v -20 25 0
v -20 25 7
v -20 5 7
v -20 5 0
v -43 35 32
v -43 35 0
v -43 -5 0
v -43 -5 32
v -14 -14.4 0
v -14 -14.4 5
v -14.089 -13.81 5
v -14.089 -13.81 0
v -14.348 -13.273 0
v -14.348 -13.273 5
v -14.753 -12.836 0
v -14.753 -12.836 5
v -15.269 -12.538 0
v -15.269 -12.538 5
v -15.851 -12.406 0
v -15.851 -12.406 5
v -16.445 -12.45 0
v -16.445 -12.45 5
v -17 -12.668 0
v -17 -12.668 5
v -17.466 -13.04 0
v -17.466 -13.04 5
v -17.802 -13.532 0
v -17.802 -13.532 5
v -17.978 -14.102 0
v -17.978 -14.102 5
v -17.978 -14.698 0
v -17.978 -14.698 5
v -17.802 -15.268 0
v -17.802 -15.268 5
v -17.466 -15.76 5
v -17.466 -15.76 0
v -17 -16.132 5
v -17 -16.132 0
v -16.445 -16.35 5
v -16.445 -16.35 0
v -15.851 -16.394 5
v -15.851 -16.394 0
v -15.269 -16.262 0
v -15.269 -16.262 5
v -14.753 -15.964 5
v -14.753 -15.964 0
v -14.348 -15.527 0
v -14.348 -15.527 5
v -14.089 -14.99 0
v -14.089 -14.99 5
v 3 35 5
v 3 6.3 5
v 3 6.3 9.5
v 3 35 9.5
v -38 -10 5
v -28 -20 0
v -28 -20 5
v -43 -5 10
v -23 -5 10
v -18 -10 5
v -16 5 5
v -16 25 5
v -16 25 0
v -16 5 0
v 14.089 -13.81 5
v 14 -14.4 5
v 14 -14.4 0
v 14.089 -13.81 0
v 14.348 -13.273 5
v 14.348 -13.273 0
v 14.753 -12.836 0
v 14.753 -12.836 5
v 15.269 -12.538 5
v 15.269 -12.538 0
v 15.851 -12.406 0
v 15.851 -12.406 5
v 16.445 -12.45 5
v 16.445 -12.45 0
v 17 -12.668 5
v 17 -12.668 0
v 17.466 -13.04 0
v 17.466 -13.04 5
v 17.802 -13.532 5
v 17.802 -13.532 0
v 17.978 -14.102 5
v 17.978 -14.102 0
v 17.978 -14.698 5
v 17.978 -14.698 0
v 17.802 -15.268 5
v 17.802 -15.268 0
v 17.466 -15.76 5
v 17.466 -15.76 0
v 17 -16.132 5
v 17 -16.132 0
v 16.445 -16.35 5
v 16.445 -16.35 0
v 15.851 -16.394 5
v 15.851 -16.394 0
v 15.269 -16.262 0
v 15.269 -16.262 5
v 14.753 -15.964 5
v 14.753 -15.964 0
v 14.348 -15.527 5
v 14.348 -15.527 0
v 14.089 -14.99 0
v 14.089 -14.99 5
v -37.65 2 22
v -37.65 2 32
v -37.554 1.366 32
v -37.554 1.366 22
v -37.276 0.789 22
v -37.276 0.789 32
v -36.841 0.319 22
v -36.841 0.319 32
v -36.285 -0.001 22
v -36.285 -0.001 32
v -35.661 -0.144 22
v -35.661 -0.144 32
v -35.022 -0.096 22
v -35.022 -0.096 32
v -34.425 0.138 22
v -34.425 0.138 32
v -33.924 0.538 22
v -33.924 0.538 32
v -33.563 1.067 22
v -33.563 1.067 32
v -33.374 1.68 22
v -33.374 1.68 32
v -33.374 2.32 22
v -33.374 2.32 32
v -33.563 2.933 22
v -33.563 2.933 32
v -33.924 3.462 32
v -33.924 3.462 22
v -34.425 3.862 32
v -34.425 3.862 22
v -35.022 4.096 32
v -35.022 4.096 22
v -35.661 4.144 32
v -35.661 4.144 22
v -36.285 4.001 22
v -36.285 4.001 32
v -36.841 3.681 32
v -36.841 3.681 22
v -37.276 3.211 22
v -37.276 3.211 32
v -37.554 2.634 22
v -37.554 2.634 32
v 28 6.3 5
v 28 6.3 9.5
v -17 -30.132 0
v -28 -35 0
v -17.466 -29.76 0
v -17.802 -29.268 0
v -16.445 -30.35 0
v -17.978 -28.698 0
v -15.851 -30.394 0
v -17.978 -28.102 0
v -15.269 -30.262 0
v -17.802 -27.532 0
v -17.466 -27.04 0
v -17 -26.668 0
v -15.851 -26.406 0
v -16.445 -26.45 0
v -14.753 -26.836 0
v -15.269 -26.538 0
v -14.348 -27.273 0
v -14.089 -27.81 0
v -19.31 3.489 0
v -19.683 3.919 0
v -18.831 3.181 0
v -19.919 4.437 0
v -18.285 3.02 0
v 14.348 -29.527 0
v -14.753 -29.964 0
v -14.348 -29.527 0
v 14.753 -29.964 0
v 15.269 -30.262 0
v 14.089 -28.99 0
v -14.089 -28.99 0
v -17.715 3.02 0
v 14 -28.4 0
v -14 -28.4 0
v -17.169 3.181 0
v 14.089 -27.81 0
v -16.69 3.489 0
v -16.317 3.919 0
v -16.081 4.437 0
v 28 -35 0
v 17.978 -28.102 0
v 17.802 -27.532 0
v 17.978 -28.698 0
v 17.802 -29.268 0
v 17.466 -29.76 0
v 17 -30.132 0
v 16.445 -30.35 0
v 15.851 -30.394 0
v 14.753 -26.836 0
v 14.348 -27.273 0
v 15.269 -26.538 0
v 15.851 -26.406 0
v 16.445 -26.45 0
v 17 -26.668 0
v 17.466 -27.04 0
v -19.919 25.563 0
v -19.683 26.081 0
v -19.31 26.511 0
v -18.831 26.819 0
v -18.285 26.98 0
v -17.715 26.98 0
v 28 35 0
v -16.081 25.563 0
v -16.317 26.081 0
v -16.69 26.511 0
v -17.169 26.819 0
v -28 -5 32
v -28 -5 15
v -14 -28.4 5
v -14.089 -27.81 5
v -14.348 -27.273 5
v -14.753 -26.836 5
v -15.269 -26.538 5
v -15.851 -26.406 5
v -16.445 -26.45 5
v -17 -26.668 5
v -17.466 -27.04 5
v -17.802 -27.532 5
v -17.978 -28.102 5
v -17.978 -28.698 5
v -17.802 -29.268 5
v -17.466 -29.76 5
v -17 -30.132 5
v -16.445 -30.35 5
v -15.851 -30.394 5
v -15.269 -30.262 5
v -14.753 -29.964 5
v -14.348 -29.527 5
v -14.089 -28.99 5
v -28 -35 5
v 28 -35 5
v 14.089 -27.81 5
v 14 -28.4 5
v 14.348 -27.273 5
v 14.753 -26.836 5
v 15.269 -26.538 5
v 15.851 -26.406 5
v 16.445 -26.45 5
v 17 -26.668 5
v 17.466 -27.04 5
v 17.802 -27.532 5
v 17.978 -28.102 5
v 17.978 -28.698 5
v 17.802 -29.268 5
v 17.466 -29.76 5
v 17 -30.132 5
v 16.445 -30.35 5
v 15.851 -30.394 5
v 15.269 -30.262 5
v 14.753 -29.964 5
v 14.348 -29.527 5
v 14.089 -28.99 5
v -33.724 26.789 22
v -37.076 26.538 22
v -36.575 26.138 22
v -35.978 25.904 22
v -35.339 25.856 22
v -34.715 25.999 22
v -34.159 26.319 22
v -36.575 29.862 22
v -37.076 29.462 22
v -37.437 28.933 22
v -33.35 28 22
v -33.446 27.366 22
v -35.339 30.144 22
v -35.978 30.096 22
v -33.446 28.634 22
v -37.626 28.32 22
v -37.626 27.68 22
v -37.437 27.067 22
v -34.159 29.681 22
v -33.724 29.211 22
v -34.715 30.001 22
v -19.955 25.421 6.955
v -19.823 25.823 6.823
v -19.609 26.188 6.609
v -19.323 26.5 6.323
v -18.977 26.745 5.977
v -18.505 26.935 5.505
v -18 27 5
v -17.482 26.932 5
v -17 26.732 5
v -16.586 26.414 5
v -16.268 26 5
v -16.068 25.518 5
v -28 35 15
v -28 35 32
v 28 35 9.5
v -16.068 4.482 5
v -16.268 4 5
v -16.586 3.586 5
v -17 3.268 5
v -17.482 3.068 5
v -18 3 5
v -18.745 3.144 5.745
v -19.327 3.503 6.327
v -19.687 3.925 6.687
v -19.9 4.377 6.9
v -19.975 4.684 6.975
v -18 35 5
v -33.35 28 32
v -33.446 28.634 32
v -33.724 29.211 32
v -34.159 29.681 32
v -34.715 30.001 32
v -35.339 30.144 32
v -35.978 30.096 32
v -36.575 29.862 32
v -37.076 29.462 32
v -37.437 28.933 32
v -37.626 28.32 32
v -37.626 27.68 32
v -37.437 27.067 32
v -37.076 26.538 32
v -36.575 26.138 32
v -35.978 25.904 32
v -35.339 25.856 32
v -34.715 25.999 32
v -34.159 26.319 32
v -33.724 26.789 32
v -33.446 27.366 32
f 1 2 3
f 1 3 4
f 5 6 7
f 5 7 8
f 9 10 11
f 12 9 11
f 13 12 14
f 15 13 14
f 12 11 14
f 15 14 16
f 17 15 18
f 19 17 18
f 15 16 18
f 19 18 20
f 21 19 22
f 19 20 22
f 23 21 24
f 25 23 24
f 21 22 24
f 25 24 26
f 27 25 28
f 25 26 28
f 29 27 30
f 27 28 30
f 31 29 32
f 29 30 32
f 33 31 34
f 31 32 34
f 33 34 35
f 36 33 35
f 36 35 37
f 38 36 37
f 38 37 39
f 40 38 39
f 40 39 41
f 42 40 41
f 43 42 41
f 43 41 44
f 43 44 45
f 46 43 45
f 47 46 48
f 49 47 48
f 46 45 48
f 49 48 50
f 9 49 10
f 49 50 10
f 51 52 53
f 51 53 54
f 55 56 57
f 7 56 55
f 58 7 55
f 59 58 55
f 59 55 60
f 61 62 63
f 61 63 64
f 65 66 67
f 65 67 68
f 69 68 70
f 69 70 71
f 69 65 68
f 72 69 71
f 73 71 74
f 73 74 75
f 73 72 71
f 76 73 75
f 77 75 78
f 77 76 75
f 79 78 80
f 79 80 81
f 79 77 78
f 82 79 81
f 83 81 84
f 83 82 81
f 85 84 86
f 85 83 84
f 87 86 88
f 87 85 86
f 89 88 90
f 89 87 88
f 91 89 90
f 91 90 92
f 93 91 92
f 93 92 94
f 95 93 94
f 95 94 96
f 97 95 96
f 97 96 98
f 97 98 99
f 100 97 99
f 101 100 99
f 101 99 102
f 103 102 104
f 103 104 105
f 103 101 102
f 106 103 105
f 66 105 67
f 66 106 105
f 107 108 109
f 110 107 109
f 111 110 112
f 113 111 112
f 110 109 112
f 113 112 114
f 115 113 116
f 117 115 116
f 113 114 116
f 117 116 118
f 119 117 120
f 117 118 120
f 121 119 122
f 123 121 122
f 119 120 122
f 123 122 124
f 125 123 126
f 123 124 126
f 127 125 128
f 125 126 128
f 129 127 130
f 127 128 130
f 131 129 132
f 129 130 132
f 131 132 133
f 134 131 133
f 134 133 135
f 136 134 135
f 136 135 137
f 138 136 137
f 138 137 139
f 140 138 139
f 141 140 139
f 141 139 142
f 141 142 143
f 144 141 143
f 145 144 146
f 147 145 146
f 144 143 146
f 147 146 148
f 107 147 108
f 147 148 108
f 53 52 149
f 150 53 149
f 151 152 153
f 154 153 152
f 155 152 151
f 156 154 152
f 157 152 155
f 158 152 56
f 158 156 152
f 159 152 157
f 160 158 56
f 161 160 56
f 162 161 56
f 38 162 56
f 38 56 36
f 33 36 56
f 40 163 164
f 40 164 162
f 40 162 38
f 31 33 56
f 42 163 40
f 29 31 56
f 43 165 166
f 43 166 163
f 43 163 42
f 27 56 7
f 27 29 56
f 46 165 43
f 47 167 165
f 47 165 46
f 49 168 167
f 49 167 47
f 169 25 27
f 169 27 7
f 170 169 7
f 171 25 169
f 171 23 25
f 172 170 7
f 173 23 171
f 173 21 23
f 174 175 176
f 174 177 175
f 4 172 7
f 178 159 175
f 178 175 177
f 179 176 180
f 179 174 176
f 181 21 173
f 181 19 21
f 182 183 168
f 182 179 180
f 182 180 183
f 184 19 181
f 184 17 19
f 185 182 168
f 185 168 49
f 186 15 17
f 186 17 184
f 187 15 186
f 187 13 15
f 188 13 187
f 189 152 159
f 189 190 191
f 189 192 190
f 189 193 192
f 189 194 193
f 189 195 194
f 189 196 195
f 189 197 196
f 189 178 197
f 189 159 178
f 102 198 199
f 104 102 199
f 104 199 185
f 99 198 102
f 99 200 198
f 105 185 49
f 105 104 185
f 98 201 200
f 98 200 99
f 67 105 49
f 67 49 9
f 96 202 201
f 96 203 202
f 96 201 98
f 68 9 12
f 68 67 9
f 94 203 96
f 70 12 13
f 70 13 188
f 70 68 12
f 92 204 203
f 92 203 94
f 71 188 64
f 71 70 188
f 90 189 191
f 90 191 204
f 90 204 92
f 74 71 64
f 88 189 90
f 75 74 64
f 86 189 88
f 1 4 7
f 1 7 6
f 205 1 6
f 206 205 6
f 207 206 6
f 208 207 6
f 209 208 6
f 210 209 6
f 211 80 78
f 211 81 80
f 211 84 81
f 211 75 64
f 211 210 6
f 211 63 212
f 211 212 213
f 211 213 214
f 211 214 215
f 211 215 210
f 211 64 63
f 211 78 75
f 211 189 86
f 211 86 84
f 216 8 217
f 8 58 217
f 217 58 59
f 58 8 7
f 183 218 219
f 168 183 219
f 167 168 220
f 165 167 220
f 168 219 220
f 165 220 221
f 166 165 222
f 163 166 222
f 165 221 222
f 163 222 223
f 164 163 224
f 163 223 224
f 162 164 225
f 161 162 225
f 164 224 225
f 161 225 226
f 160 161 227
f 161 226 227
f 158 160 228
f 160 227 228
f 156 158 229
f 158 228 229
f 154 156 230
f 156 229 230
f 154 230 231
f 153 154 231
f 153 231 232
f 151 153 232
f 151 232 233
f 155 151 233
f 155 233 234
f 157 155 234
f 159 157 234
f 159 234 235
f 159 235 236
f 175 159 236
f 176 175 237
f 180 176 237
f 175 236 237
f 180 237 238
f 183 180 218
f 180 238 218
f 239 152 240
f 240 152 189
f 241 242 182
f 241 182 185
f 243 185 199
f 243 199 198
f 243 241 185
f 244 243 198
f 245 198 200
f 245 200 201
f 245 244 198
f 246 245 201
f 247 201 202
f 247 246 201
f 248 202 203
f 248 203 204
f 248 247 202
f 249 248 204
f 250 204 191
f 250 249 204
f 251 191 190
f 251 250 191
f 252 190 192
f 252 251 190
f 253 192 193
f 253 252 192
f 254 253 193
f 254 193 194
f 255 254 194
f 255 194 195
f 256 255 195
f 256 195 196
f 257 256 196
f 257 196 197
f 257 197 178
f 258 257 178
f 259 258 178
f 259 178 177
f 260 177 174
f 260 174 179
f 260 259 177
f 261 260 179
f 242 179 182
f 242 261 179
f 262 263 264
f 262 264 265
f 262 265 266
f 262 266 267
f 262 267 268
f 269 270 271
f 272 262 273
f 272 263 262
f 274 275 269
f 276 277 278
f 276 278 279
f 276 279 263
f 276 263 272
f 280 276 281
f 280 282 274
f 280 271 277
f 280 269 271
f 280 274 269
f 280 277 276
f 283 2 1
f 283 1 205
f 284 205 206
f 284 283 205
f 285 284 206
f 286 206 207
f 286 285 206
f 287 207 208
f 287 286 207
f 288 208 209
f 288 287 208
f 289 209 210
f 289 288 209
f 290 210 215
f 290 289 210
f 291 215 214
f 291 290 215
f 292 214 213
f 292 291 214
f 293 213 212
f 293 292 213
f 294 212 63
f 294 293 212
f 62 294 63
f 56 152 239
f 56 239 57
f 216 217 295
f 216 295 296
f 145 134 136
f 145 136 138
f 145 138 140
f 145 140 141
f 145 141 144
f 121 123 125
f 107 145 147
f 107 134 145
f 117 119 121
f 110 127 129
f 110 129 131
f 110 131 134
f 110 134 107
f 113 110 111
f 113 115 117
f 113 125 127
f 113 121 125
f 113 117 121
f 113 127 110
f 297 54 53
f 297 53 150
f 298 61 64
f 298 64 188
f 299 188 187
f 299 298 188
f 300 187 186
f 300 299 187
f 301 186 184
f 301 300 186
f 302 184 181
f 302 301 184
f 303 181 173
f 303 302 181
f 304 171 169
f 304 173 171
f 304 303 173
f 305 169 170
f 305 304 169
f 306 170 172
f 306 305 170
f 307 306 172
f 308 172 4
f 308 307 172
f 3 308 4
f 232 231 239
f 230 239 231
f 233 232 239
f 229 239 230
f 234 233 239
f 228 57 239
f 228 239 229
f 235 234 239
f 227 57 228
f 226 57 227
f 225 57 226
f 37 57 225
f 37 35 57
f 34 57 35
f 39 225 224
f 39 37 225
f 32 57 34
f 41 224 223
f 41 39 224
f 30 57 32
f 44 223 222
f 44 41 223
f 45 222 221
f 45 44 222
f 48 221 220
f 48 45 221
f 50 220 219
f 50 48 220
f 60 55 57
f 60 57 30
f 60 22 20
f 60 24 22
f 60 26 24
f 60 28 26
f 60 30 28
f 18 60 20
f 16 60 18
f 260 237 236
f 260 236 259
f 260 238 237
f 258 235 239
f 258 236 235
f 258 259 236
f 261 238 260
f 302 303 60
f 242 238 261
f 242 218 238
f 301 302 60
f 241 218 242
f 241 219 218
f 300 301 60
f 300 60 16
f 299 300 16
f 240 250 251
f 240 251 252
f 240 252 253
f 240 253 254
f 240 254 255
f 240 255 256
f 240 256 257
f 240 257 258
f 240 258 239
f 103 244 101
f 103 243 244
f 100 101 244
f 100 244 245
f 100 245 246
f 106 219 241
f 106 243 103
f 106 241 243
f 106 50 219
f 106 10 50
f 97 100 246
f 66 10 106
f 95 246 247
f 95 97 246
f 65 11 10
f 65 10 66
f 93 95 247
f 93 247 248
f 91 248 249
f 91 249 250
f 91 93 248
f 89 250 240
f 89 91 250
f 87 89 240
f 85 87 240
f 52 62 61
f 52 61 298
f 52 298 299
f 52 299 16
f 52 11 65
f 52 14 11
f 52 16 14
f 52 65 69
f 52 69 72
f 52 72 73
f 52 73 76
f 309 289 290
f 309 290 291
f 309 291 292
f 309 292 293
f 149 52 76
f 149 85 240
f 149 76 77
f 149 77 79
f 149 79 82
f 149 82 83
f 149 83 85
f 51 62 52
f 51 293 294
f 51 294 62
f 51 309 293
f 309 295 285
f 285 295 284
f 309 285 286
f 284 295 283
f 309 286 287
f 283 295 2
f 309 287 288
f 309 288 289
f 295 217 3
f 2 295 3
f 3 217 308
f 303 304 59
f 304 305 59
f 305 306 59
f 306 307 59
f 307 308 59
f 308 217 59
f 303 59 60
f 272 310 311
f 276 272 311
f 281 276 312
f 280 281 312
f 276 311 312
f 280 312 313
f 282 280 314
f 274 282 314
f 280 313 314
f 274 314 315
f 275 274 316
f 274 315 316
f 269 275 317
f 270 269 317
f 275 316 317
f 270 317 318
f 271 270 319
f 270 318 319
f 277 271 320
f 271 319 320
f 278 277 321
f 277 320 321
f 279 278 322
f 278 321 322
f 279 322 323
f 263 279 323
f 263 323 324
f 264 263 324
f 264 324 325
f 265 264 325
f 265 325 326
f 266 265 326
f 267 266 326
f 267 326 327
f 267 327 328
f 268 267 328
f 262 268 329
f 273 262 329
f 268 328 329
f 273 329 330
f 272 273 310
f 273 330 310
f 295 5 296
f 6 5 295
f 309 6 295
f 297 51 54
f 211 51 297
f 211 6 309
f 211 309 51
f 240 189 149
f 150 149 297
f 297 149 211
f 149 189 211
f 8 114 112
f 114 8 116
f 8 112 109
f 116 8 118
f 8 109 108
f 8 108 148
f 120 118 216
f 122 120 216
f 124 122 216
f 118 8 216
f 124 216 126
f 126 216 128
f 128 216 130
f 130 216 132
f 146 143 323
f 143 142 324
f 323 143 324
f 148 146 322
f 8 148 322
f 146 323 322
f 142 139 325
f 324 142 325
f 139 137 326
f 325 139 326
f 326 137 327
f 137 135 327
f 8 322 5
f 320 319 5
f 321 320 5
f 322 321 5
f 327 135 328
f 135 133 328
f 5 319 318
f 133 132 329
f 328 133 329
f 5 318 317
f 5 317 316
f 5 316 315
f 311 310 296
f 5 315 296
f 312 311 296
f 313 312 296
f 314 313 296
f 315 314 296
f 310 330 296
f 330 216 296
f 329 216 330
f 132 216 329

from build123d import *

# Parameters (mm, degrees)
SKETCH_1_W          = 56
SKETCH_1_H          = 70
EXTRUDE_1_DEPTH     = 5
SKETCH_2_R          = 2
CUT_EXTRUDE_1_DEPTH = 5
SKETCH_5_W          = 25
SKETCH_5_H          = 28.7
EXTRUDE_3_DEPTH     = 4.5
SKETCH_6_W          = 32
SKETCH_6_H          = 40
EXTRUDE_4_DEPTH     = 15
SKETCH_9_R          = 2.15
CUT_EXTRUDE_2_DEPTH = 10
CUT_EXTRUDE_3_DEPTH = 10
CHAMFER_START       = -5
CHAMFER_1_DEPTH     = 40
CHAMFER_1_2_DEPTH   = 10
CHAMFER_START_2     = 25
CHAMFER_1_3_DEPTH   = 10
CHAMFER_START_3     = 5
CHAMFER_1_4_DEPTH   = 3
CHAMFER_2_SIZE      = 15
CHAMFER_3_SIZE      = 5


with BuildPart() as part:
    # 草图1 → 凸台-拉伸1 (new body)
    with BuildSketch(Plane.XY):
        Rectangle(SKETCH_1_W, SKETCH_1_H)
    extrude(amount=EXTRUDE_1_DEPTH)

    # 草图2 → 切除-拉伸1 (cut)
    with BuildSketch(Plane.XY.offset(5)):
        with Locations((-16, -28.4)):
            Circle(SKETCH_2_R)
        with Locations((-16, -14.4)):
            Circle(SKETCH_2_R)
    cut_extrude_1 = extrude(amount=-CUT_EXTRUDE_1_DEPTH, mode=Mode.SUBTRACT)

    # 镜向1: 切除-拉伸1 across plane
    add(cut_extrude_1.mirror(Plane(origin=(0, 0, 0), x_dir=(0, 0, 1), z_dir=(1, 0, 0))), mode=Mode.SUBTRACT)

    # 草图5 → 凸台-拉伸3 (add)
    with BuildSketch(Plane.XY.offset(5)):
        with Locations((15.5, 20.65)):
            Rectangle(SKETCH_5_W, SKETCH_5_H)
    extrude(amount=EXTRUDE_3_DEPTH)

    # 草图6 → 凸台-拉伸4 (add)
    with BuildSketch(Plane.ZY.offset(28)):
        with Locations((16, 15)):
            Rectangle(SKETCH_6_W, SKETCH_6_H)
    extrude(amount=EXTRUDE_4_DEPTH)

    # 草图9 → 切除-拉伸2 (cut)
    with BuildSketch(Plane.XY.offset(32)):
        with Locations((-35.5, 28)):
            Circle(SKETCH_9_R)
        with Locations(Location((-35.5, 2, 0), (0, 0, 180))):
            Circle(SKETCH_9_R)
    extrude(amount=-CUT_EXTRUDE_2_DEPTH, mode=Mode.SUBTRACT)

    # 草图10 → 切除-拉伸3 (cut)
    with BuildSketch(Plane.XY.offset(5)):
        with BuildLine():
            Line((-20, 5), (-20, 25))
            ThreePointArc((-20, 25), (-18, 27), (-16, 25))
            Line((-16, 25), (-16, 5))
            ThreePointArc((-16, 5), (-18, 3), (-20, 5))
        make_face()
    extrude(amount=-CUT_EXTRUDE_3_DEPTH, mode=Mode.SUBTRACT)

    # 倒角1: read off the stored shape, not the designer's step
    # 倒角1 outline → 倒角1 (add)
    with BuildSketch(Plane(origin=(0, 0, 0), x_dir=(1, 0, 0), z_dir=(0, 1, 0)).offset(CHAMFER_START)):
        Polygon((-20, -7), (-20, -5), (-28, -5), (-28, -15), align=None)
    extrude(amount=CHAMFER_1_DEPTH)

    # Chamfer 1 2 outline → Chamfer 1 2 (add)
    with BuildSketch(Plane(origin=(0, 0, 0), x_dir=(1, 0, 0), z_dir=(0, 1, 0)).offset(CHAMFER_START)):
        Polygon((-18, -5), (-20, -5), (-20, -7), align=None)
    extrude(amount=CHAMFER_1_2_DEPTH)

    # Chamfer 1 3 outline → Chamfer 1 3 (add)
    with BuildSketch(Plane(origin=(0, 0, 0), x_dir=(1, 0, 0), z_dir=(0, 1, 0)).offset(CHAMFER_START_2)):
        Polygon((-18, -5), (-20, -5), (-20, -7), align=None)
    extrude(amount=CHAMFER_1_3_DEPTH)

    # Chamfer 1 4 outline → Chamfer 1 4 (cut)
    with BuildSketch(Plane.XY.offset(CHAMFER_START_3)):
        with BuildLine():
            Line((-16, 5), (-20, 5))
            ThreePointArc((-20, 5), (-18, 3), (-16, 5))
        make_face()
        with BuildLine():
            Line((-20, 25), (-16, 25))
            ThreePointArc((-16, 25), (-18, 27), (-20, 25))
        make_face()
    extrude(amount=CHAMFER_1_4_DEPTH, mode=Mode.SUBTRACT)

    # 倒角2
    chamfer_2_edges = [part.edges().sort_by_distance(p)[0] for p in [
        (-28, -5, 2.5),
    ]]
    chamfer(chamfer_2_edges, length=CHAMFER_2_SIZE - 0.0001)  # a hair under: the kernel refuses the full size

    # 倒角3
    chamfer_3_edges = [part.edges().sort_by_distance(p)[0] for p in [
        (-30.49995, -5, 5),
    ]]
    chamfer(chamfer_3_edges, length=CHAMFER_3_SIZE)


solid = part.part
